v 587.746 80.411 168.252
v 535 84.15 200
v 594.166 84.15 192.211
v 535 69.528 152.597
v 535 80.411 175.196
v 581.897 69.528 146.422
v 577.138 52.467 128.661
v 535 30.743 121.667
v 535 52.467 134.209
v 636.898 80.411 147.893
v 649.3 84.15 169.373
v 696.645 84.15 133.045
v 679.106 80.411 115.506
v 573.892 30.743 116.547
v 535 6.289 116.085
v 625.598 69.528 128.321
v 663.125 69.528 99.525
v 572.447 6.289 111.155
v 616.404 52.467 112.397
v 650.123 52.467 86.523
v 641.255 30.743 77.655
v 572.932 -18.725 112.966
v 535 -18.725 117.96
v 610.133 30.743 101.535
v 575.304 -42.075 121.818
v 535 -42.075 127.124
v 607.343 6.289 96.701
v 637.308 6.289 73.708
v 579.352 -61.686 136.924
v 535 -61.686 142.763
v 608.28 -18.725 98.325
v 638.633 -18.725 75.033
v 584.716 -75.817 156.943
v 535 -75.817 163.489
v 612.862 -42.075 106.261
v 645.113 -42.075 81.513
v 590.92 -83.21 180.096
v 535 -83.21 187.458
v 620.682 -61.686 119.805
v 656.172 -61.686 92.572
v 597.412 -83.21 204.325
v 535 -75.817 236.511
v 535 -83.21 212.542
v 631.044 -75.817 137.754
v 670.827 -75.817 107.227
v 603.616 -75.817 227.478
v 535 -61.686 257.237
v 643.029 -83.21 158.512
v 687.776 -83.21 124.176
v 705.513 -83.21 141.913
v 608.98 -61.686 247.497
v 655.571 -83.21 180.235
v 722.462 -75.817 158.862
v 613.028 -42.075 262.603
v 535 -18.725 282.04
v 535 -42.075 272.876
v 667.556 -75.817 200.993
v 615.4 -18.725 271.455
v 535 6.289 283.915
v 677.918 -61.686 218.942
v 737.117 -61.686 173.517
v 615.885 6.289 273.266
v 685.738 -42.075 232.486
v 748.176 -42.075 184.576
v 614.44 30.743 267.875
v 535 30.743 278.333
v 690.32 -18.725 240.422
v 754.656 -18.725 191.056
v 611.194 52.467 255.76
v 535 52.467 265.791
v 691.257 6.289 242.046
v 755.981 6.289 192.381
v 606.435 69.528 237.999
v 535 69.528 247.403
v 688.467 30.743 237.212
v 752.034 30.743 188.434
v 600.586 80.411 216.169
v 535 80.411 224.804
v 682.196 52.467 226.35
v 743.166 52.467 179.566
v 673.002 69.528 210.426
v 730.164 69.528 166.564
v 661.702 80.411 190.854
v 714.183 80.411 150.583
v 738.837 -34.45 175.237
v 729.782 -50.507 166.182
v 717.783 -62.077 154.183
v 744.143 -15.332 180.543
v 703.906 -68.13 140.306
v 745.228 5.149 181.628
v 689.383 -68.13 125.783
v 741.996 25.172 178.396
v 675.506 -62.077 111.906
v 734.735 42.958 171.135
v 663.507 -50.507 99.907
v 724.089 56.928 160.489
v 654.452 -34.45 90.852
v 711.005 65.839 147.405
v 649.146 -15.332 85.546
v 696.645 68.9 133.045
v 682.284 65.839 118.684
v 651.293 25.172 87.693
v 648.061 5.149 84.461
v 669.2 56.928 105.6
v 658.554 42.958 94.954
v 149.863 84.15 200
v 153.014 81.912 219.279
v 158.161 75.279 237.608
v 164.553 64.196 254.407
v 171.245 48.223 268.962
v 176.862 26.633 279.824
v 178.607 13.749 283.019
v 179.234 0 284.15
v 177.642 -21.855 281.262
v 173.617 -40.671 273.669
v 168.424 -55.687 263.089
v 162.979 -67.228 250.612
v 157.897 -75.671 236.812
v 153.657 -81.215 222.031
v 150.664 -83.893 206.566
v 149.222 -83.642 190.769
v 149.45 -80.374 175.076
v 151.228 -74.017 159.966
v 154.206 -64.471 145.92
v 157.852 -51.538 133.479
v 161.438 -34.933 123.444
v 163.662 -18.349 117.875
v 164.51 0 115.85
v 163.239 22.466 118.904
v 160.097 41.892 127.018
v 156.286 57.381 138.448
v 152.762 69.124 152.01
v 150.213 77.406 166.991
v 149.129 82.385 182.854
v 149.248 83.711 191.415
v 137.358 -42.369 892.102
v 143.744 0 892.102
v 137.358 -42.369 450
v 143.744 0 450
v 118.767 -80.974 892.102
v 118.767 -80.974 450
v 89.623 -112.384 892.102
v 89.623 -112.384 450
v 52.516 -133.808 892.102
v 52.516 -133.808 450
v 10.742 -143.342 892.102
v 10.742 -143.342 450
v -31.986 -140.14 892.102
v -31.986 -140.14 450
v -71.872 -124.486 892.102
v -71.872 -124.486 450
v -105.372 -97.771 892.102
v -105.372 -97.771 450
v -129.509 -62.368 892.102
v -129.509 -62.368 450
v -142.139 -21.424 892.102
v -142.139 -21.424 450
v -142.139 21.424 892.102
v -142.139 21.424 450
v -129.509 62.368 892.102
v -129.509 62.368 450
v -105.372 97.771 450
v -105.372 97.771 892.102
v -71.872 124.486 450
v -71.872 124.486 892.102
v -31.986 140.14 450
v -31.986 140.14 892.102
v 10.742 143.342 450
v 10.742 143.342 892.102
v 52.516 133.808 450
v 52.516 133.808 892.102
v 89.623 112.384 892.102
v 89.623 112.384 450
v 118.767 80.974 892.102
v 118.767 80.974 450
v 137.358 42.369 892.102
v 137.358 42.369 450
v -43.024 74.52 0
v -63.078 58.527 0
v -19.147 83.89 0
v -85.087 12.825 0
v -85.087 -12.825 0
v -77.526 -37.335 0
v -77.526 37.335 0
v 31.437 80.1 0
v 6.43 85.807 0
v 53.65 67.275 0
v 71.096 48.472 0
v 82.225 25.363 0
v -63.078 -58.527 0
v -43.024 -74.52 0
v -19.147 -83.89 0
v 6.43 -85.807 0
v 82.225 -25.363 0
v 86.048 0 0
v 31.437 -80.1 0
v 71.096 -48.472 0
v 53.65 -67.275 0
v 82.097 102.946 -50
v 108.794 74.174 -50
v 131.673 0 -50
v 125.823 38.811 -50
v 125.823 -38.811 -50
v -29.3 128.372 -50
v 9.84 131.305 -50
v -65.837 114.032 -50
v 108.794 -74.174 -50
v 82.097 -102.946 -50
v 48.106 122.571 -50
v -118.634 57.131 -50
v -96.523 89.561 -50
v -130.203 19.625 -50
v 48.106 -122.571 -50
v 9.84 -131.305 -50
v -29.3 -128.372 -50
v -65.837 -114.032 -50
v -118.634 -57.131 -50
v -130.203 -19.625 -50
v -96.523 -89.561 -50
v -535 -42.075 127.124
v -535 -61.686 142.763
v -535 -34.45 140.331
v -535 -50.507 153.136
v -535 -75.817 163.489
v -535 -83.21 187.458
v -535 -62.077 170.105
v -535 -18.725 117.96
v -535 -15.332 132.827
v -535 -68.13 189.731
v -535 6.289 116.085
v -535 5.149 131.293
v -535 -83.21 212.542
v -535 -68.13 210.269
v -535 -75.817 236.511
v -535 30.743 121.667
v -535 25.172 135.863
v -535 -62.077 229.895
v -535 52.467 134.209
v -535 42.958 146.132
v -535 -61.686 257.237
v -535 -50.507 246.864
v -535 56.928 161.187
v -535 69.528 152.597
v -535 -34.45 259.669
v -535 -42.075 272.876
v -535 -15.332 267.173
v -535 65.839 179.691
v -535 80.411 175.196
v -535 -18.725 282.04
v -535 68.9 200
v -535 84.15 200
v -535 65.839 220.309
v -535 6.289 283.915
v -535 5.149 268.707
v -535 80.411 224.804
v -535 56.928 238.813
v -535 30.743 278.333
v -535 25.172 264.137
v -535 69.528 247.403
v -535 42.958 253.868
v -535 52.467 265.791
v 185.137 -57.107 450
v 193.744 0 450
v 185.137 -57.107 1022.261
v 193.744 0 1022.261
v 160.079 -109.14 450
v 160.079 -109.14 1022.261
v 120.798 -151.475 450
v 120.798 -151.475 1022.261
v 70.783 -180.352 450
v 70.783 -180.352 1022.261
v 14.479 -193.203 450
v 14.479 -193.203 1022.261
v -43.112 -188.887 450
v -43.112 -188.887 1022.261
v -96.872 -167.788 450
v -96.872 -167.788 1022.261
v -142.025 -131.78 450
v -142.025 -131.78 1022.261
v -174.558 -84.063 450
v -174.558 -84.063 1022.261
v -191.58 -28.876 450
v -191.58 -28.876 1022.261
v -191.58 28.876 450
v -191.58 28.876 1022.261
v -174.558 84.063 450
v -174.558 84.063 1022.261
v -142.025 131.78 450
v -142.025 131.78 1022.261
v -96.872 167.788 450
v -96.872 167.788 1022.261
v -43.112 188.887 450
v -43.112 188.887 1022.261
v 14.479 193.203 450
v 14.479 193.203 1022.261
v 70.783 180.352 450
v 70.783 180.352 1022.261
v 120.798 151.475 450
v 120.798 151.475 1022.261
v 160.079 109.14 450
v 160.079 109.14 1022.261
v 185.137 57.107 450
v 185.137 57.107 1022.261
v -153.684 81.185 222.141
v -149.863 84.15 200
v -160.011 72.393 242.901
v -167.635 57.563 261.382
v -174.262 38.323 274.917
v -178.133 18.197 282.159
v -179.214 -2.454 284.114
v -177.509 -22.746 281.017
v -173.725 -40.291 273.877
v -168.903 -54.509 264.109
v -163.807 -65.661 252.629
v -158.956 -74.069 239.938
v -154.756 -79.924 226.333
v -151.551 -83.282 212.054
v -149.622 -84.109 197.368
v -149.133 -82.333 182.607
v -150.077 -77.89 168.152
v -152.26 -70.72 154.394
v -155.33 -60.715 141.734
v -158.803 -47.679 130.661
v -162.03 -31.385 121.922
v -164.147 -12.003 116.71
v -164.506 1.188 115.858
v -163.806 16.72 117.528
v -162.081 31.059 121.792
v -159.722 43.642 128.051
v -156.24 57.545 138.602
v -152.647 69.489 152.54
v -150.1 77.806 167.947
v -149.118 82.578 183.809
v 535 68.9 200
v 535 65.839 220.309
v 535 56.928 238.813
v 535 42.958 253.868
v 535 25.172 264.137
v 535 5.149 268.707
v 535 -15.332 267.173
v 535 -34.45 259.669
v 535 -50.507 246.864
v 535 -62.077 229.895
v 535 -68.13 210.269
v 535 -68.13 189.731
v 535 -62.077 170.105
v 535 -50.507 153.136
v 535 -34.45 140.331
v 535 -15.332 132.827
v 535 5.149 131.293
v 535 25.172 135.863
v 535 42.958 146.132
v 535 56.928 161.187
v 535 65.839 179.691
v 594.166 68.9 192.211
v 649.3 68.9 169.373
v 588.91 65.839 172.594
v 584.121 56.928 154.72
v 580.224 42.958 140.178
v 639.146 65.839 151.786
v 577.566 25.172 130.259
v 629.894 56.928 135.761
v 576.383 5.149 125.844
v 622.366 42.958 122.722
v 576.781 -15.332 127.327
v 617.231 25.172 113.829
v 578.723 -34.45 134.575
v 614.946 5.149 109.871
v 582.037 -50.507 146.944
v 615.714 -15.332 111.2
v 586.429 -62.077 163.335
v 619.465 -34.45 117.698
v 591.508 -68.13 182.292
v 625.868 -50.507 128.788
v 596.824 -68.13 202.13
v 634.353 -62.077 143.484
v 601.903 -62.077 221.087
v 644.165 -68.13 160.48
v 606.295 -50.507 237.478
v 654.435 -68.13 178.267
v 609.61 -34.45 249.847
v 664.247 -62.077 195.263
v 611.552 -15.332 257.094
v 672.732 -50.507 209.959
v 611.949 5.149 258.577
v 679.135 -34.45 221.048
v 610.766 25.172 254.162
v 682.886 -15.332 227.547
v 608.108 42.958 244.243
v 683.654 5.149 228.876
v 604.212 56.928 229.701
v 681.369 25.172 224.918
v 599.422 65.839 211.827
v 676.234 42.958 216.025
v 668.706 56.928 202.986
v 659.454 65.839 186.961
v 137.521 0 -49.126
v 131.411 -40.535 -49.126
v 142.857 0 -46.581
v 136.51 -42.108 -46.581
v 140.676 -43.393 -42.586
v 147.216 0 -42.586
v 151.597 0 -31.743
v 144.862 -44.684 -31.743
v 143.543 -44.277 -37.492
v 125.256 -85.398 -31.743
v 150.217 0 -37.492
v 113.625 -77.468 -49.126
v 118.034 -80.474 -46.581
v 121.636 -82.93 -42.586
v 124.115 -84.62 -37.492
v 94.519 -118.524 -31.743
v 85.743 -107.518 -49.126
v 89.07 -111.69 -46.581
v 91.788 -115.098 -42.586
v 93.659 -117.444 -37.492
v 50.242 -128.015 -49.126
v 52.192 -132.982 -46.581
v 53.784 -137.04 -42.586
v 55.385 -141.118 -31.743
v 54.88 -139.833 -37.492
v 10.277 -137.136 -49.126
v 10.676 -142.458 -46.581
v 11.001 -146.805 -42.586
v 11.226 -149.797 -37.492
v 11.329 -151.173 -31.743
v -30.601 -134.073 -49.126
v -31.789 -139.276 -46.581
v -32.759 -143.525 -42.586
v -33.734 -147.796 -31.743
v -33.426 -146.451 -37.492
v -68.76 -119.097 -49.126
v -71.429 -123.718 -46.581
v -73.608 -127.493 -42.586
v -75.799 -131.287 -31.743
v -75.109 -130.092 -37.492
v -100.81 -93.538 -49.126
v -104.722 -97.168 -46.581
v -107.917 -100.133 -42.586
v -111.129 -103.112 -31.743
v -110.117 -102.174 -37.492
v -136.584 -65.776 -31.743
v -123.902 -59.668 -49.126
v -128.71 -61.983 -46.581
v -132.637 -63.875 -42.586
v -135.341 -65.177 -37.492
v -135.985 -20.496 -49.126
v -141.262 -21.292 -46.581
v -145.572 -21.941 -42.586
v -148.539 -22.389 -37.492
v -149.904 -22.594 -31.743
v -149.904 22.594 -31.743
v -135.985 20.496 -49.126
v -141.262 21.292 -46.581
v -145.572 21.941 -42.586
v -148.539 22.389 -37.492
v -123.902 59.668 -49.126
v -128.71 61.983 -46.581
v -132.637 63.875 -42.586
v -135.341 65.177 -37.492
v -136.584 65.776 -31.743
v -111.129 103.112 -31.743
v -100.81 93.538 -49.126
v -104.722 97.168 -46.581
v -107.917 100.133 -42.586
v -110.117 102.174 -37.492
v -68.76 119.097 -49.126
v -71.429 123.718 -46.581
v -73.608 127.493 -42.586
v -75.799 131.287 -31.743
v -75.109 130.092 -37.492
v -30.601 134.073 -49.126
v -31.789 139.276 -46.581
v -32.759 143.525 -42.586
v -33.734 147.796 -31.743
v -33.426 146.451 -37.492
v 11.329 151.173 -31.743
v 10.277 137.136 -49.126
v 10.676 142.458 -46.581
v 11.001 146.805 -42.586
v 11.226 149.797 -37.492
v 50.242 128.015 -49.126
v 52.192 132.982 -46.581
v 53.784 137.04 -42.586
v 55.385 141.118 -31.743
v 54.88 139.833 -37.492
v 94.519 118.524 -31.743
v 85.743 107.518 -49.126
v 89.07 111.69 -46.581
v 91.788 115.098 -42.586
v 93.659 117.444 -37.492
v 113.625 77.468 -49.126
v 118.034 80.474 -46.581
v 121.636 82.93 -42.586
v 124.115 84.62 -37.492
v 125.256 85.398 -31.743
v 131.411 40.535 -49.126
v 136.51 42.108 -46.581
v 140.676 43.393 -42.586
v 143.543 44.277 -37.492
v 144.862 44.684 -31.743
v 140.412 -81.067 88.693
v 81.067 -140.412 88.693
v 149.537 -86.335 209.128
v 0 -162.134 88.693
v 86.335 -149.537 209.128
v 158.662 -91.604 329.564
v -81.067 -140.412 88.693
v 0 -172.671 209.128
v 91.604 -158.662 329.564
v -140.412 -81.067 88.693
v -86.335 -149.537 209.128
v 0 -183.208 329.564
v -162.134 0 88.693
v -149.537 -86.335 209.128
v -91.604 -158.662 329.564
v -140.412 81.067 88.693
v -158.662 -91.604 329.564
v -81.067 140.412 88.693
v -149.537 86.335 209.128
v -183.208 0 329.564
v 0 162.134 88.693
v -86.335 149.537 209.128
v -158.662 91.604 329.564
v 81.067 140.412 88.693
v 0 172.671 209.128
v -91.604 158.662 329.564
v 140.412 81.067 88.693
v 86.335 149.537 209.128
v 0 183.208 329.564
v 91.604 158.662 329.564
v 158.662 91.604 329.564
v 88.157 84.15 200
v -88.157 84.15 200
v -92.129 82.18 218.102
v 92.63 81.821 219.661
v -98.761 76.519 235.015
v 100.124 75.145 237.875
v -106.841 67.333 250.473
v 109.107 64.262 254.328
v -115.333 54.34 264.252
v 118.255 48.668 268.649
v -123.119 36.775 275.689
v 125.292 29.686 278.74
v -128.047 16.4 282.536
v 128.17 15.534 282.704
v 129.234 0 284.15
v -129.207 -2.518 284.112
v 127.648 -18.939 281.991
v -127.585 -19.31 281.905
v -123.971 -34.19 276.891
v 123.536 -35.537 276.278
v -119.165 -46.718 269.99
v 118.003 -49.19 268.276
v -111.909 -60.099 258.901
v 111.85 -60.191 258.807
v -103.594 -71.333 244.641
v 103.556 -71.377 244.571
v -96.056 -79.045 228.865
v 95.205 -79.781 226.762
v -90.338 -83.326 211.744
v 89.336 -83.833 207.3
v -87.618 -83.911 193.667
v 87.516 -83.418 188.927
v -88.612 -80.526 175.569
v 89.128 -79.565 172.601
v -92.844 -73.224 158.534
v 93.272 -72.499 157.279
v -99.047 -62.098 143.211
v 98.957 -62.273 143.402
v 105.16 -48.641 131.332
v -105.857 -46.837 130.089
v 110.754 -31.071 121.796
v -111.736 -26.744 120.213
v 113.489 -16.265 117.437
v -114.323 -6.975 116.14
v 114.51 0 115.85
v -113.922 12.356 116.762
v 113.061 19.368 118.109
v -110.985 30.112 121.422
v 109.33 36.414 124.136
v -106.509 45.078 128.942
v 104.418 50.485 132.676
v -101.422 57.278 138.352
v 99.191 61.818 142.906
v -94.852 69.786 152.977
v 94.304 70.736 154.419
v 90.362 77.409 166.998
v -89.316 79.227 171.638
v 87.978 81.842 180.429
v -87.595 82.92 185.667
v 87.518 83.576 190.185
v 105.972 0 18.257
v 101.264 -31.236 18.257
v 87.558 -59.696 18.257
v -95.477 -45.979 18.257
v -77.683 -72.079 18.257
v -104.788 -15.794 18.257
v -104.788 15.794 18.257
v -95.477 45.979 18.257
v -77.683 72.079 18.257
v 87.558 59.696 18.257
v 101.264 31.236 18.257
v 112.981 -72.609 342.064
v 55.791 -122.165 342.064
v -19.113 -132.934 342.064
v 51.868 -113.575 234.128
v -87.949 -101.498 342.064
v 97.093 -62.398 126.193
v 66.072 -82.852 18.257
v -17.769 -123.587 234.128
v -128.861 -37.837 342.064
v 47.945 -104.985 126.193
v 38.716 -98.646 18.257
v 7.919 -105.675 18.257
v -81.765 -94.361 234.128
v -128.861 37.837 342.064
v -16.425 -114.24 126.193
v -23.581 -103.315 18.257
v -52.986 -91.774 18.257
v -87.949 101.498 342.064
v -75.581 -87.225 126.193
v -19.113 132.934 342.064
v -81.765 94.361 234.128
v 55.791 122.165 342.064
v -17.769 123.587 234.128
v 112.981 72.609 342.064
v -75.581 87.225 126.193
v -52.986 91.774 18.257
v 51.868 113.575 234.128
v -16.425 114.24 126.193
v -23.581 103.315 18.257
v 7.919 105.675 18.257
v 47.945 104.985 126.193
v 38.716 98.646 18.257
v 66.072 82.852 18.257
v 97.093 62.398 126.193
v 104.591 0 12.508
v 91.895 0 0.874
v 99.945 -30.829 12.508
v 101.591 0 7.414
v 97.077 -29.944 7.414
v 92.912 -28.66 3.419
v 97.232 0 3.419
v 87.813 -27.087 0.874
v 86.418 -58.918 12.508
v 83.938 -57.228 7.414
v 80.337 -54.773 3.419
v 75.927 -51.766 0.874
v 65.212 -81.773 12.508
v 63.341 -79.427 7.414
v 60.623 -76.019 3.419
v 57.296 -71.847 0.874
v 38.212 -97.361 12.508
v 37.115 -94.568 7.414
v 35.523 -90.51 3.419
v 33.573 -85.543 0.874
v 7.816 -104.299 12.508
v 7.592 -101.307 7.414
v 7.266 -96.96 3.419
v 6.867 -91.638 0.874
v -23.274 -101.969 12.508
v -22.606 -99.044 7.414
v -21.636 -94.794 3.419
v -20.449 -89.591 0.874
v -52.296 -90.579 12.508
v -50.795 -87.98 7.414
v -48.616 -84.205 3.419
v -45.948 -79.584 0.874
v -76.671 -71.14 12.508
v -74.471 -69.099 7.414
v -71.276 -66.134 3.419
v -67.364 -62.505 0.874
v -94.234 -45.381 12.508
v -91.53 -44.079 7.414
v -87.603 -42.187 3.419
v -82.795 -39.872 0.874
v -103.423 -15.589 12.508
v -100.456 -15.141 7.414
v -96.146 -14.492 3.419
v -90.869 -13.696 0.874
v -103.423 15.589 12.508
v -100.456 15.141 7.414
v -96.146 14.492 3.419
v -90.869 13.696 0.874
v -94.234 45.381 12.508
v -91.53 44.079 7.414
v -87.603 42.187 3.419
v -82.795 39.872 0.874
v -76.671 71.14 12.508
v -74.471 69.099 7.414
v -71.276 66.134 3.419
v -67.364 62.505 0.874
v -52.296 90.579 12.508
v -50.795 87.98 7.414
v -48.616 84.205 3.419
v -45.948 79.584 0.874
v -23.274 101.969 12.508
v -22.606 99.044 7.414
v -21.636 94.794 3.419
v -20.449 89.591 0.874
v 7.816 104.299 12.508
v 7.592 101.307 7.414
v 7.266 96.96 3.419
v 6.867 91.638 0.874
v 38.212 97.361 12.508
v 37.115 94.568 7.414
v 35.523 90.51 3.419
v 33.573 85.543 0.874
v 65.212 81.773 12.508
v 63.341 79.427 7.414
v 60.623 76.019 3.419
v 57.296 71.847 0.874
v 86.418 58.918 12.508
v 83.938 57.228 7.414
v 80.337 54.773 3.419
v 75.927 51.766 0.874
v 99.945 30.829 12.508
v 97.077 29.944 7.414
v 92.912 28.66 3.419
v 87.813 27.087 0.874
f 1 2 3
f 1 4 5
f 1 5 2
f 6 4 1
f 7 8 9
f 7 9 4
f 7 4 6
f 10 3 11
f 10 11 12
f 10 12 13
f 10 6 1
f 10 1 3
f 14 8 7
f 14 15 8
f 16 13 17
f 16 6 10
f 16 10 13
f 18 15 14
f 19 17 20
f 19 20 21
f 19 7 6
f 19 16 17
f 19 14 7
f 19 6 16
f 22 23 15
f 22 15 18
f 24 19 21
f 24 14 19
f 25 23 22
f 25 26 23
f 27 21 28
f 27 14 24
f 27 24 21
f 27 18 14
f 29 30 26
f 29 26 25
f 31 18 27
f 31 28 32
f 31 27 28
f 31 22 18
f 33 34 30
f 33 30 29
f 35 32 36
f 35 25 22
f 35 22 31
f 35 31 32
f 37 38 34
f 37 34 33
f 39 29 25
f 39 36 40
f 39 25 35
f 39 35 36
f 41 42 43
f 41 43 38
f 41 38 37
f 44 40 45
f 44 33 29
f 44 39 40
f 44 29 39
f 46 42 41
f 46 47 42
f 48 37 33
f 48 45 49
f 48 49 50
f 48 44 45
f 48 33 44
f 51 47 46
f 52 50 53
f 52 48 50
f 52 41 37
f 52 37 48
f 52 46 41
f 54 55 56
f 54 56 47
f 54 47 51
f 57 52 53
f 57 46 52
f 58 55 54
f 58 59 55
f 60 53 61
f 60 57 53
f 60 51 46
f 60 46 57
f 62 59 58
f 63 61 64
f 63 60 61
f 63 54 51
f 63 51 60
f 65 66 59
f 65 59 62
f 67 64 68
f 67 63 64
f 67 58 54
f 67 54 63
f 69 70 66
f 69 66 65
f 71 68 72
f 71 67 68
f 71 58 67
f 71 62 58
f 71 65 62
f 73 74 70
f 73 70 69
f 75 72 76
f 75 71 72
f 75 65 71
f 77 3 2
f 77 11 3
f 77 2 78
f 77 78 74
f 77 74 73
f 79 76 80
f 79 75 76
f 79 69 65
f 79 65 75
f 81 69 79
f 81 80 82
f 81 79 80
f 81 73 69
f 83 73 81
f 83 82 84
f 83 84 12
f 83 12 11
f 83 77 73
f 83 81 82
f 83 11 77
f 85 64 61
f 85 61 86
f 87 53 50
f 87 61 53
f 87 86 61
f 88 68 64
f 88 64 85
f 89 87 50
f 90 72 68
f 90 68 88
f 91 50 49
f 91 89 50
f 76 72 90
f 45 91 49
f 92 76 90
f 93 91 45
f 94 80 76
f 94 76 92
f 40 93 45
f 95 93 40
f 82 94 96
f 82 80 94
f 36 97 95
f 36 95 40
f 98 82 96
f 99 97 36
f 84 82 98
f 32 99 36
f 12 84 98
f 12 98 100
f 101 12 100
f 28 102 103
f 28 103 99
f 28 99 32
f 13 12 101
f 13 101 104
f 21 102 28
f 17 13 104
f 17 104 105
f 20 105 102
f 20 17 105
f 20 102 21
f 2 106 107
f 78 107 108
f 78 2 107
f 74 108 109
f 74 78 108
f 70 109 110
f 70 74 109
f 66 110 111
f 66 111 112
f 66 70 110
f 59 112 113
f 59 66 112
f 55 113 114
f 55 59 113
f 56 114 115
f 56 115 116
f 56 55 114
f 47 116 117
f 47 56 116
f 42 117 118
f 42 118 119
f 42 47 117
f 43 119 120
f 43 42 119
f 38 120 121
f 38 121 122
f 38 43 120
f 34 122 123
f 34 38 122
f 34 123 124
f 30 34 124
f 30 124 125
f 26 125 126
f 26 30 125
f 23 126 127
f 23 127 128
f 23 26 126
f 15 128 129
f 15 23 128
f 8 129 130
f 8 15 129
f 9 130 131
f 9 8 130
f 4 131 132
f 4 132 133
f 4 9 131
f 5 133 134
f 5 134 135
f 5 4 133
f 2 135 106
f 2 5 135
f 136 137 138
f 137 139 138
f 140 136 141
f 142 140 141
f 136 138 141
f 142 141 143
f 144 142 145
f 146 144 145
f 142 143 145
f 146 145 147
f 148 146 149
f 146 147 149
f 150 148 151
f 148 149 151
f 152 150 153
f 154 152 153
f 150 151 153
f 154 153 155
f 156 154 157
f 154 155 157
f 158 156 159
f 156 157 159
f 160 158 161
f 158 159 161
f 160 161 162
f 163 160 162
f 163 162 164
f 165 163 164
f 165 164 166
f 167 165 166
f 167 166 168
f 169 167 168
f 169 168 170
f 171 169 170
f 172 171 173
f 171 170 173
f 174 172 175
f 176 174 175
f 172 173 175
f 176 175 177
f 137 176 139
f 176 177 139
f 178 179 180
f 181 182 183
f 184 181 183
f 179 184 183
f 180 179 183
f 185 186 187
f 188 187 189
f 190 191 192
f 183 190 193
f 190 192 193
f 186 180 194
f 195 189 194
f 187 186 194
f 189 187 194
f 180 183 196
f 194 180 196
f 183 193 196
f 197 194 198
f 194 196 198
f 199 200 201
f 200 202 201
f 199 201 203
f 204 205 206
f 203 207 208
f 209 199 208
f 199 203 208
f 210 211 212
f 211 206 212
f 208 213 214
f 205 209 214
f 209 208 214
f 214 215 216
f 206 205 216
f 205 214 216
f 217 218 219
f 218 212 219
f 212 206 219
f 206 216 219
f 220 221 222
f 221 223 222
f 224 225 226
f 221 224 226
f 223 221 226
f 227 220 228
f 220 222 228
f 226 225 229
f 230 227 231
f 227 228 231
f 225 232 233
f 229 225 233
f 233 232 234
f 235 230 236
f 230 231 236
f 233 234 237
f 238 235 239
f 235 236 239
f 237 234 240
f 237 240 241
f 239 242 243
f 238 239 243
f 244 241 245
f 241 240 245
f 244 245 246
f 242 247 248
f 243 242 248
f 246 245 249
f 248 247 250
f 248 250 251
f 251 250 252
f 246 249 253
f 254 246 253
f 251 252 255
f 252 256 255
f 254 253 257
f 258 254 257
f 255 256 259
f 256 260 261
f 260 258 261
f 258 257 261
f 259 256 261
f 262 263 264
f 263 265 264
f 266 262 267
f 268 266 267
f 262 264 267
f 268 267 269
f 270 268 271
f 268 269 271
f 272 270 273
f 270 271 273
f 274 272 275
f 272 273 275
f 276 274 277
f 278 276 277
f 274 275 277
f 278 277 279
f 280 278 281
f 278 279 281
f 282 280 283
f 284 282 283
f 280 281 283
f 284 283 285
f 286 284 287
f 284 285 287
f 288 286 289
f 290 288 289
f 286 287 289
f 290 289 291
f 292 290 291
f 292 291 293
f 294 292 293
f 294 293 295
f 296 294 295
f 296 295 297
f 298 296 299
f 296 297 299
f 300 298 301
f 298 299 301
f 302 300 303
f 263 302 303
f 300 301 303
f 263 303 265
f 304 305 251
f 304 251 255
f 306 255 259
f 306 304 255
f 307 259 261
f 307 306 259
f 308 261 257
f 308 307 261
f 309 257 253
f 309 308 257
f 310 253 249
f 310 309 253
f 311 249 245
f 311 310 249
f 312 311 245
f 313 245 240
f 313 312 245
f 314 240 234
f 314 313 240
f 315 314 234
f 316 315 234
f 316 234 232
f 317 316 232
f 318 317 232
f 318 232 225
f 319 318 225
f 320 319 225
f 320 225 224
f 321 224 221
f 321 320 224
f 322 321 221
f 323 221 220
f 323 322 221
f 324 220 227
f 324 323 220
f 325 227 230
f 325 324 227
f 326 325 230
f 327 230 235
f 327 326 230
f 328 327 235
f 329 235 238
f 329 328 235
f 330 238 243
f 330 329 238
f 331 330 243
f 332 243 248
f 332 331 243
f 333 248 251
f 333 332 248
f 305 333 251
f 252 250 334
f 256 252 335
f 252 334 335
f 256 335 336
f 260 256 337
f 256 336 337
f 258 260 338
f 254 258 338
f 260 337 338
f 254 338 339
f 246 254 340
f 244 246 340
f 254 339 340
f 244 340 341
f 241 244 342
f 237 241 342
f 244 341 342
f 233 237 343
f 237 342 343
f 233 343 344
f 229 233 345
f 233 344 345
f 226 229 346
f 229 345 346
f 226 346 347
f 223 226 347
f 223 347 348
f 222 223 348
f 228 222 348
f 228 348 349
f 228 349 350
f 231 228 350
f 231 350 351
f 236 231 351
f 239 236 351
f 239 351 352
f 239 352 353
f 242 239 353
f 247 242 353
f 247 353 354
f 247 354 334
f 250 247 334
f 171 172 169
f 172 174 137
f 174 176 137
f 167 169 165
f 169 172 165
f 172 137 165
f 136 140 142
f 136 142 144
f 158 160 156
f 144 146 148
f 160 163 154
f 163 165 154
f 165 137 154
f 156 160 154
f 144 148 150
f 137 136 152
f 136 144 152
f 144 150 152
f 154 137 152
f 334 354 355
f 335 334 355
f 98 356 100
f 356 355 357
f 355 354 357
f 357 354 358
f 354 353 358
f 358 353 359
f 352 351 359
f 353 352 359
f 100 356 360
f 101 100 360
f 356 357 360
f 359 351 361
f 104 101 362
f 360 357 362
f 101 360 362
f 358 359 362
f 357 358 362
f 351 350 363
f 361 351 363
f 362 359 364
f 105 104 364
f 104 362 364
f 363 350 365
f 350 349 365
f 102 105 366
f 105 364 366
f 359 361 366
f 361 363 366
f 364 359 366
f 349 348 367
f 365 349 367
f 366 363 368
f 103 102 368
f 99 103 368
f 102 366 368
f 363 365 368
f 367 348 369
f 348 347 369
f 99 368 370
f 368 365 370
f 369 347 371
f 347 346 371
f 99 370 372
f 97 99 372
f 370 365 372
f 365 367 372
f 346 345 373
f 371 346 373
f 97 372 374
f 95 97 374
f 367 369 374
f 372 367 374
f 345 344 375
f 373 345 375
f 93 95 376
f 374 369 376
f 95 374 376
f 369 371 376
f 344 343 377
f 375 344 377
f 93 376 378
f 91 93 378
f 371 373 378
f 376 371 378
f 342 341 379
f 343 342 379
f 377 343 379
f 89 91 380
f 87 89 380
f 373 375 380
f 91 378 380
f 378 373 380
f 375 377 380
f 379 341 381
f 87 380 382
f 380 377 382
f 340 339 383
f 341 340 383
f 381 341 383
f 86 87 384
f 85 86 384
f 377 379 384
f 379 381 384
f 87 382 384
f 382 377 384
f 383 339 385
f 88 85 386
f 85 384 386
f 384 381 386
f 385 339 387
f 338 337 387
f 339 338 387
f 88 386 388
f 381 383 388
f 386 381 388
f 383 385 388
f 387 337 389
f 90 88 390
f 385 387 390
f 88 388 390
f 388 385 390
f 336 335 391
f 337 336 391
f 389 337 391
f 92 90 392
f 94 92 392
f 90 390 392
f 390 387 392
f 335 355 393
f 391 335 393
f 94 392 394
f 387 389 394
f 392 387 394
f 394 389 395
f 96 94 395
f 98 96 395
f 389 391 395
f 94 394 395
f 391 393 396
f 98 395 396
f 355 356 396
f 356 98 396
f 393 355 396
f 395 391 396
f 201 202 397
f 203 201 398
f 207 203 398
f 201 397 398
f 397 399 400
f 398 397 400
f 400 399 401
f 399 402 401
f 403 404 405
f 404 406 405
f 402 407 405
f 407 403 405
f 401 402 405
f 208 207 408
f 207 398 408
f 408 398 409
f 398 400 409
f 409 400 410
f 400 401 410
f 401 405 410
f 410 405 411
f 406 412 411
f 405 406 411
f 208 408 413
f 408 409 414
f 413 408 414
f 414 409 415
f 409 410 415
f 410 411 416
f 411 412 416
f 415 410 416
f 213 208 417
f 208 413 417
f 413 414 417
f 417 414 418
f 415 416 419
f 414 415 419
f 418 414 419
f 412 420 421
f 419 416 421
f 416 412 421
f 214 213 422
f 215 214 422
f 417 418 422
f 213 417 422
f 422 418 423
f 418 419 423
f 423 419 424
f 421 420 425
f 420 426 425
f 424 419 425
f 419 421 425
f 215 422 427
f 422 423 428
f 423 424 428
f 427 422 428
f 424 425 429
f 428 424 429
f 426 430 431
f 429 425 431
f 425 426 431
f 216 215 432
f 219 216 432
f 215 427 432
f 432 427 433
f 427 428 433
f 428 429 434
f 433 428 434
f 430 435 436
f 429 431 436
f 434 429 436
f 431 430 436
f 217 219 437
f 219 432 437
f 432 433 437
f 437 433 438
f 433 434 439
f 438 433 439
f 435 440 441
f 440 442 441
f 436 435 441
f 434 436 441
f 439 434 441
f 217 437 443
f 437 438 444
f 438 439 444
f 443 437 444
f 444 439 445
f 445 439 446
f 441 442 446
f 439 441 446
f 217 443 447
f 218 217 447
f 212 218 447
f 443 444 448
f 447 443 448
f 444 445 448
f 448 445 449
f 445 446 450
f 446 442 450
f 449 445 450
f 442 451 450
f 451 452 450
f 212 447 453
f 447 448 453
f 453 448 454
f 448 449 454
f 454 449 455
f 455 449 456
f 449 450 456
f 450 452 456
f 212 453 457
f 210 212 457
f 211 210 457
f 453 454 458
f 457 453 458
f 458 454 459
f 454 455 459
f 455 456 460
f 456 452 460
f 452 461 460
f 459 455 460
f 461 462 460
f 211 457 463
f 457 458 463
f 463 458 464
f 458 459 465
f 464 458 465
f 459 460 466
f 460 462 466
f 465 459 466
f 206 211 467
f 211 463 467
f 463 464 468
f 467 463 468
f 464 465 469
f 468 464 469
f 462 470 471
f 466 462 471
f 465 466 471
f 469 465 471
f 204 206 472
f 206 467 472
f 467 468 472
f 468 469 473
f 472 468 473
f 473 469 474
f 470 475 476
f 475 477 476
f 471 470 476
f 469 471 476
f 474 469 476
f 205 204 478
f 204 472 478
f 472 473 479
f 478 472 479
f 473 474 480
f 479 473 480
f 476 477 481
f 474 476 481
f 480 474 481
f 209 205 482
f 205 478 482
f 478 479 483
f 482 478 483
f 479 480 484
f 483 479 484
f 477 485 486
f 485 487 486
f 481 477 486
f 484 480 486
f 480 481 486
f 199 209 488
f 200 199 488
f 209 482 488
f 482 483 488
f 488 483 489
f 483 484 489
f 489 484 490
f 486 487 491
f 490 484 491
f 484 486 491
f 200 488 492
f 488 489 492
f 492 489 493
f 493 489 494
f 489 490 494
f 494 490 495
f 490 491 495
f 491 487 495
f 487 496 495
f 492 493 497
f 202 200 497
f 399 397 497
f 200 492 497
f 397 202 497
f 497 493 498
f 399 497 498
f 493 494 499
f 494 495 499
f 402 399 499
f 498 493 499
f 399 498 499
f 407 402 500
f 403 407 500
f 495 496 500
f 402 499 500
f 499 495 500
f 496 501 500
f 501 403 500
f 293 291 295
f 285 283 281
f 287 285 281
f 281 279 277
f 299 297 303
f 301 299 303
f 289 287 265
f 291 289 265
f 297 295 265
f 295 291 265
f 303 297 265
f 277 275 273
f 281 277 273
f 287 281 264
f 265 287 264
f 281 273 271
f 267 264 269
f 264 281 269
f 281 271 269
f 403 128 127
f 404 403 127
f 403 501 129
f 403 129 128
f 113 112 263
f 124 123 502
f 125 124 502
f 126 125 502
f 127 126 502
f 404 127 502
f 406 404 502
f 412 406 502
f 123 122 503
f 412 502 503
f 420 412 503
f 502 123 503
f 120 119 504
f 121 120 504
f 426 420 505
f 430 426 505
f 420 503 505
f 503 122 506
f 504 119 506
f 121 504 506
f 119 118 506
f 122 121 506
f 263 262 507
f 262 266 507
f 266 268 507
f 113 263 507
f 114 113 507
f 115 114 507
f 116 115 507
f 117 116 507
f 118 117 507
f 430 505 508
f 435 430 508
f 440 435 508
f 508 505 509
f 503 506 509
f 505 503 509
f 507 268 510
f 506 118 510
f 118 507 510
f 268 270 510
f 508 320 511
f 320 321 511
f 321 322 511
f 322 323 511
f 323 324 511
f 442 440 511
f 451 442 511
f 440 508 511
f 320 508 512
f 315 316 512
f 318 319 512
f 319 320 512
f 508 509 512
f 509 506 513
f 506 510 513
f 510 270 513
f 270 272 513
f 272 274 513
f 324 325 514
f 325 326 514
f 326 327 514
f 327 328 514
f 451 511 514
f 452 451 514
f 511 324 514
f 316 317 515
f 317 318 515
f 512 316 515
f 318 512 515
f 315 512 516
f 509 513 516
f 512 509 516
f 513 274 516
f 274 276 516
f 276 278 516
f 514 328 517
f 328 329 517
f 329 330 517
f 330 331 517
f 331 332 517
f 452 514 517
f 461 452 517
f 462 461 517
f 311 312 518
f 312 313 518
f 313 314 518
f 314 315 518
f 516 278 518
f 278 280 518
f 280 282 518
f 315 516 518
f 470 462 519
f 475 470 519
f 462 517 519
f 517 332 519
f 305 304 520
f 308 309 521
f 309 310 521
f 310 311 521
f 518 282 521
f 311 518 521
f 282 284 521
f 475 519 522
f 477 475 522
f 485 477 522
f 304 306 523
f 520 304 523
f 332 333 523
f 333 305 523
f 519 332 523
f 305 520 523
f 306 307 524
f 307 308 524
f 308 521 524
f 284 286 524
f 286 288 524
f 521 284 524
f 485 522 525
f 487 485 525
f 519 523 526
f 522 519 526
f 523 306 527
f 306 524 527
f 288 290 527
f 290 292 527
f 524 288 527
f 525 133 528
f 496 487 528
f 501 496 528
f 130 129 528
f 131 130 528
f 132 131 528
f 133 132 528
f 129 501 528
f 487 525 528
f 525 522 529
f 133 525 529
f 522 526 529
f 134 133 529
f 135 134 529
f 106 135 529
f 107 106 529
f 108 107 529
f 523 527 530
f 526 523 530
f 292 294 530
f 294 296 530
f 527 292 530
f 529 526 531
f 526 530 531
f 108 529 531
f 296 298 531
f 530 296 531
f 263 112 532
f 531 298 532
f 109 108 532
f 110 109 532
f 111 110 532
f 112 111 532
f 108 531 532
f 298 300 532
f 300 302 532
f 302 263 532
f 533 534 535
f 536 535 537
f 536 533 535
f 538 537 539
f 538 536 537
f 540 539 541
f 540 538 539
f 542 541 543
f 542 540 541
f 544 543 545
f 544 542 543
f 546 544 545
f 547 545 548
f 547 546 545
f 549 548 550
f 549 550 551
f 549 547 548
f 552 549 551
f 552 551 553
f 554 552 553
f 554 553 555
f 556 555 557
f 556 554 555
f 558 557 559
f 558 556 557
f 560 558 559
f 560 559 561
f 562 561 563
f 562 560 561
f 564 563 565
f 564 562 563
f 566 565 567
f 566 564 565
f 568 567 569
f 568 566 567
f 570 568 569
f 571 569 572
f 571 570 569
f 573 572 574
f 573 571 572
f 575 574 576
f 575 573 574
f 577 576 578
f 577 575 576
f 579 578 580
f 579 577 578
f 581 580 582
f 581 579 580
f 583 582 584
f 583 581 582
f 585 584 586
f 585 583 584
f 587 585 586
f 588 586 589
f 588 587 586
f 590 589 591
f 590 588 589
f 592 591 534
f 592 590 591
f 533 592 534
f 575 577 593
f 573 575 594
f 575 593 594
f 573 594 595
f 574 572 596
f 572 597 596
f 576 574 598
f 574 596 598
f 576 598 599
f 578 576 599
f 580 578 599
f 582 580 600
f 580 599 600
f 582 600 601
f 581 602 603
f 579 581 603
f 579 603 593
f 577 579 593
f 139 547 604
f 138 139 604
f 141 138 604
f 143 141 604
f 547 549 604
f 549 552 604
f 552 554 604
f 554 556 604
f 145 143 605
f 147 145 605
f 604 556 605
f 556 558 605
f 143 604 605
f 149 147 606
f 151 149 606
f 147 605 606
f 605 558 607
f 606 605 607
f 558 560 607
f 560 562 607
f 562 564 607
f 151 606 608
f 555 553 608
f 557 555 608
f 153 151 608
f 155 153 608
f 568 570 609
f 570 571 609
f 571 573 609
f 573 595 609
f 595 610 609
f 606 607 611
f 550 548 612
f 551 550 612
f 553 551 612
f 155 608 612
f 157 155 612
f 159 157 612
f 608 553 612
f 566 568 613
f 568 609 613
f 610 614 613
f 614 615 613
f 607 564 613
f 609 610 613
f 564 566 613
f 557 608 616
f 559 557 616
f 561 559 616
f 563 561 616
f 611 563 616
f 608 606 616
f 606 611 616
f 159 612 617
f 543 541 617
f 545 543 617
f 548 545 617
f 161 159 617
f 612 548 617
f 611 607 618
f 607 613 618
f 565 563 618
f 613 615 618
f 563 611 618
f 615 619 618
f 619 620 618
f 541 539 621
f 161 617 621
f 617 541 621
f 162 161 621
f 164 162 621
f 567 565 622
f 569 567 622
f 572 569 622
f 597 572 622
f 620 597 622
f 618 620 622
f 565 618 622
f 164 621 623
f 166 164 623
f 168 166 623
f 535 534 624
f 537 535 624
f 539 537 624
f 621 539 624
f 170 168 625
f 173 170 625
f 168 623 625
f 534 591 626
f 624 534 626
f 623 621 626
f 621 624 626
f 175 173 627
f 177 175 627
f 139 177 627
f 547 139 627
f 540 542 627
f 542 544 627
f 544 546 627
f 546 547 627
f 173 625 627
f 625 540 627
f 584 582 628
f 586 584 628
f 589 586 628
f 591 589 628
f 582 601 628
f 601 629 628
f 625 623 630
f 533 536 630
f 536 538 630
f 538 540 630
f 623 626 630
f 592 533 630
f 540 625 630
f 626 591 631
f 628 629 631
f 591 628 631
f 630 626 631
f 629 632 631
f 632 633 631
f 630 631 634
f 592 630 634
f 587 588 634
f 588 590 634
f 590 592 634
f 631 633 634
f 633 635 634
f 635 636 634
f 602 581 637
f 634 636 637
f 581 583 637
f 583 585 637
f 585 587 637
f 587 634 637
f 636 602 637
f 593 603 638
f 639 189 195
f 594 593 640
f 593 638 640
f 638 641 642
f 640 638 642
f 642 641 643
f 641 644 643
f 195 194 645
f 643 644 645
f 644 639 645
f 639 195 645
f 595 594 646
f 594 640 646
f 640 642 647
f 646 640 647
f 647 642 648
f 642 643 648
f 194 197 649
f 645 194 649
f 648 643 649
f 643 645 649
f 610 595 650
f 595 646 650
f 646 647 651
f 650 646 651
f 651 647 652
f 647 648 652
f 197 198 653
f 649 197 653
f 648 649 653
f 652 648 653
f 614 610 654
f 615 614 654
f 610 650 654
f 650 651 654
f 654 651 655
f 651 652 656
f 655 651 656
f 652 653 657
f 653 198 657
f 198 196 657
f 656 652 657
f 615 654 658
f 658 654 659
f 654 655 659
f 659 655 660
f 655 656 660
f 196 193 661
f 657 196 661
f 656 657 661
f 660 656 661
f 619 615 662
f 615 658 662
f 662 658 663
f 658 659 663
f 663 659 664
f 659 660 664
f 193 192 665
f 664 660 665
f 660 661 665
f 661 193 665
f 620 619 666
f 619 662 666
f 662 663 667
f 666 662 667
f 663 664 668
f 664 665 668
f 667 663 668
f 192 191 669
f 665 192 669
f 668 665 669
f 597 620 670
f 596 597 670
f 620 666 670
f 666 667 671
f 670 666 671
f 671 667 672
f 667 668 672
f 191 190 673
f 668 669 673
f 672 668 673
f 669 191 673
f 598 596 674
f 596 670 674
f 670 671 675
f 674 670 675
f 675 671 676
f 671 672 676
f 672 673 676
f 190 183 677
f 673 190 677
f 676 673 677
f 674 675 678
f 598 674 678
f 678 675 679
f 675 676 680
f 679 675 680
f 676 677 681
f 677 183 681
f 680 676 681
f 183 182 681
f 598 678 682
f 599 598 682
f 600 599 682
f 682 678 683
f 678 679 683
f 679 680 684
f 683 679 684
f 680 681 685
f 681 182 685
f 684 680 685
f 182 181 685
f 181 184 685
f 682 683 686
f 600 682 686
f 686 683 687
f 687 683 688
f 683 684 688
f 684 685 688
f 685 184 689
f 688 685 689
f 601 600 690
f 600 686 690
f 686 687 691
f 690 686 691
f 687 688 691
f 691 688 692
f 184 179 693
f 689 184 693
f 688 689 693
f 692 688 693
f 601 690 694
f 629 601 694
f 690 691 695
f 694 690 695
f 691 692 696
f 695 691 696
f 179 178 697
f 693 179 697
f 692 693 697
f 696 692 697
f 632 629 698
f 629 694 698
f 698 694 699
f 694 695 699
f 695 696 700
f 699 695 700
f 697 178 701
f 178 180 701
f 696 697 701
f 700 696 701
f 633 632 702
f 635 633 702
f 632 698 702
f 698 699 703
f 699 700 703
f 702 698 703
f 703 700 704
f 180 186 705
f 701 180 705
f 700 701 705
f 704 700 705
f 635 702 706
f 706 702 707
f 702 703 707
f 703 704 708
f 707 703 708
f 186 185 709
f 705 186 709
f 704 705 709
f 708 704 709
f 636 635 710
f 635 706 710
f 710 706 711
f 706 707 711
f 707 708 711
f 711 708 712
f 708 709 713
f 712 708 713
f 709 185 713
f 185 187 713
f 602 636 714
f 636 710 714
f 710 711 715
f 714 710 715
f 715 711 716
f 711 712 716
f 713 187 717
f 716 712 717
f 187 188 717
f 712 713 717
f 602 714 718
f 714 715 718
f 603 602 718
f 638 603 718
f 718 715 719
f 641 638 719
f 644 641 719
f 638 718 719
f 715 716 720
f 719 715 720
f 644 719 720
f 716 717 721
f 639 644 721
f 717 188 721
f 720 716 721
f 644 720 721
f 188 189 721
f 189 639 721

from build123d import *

# Parameters (mm, degrees)
F2_R         = 84.15
F3_DEPTH     = 535
F5_D         = 137.8
F3_FACE1_R   = 84.15
F3_FACE1_R_2 = 68.9


with BuildPart() as f1:
    # F0 (on Front) → F1 (revolve)
    with BuildSketch(Plane.XZ):
        with BuildLine():
            Line((86.0478096959, 0), (0, 0))
            Line((0, 0), (0, -50))
            Line((0, -50), (131.6733765197, -50))
            ThreePointArc((131.6733765197, -50), (145.185180672, -44.7455467362), (151.5972704815, -31.743114855))
            Line((151.5972704815, -31.743114855), (193.744331763, 450))
            Line((193.744331763, 450), (193.744331763, 1022.2607851028))
            Line((193.744331763, 1022.2607851028), (0, 1022.2607851028))
            Line((0, 1022.2607851028), (0, 892.1018242836))
            Line((0, 892.1018242836), (143.744331763, 892.1018242836))
            Line((143.744331763, 892.1018242836), (143.744331763, 450))
            Line((143.744331763, 450), (105.9717036578, 18.256885145))
            ThreePointArc((105.9717036578, 18.256885145), (99.5596138483, 5.2544532638), (86.0478096959, 0))
        make_face()
    revolve(axis=Axis((0, 0, -25), (0, 0, -1)))

    # F2 (on Right) → F3 (join, symmetric)
    with BuildSketch(Plane.YZ):
        with Locations((0, 200)):
            Circle(F2_R)
    extrude(amount=F3_DEPTH, both=True)

    # F5 (through all)
    with Locations(Plane(origin=(-535, 0, 0), x_dir=(0, -1, 0), z_dir=(-1, 0, 0))):
        with Locations((0, 200)):
            Hole(F5_D / 2)

    # F8: sweep along a path in F7
    with BuildLine(Plane(origin=(0, 0, 0), x_dir=(-1, 0, 0), z_dir=(0, 1, 0))) as f8_path:
        ThreePointArc((-535, 200), (-622.4814326387, 182.5988611321), (-696.6446101792, 133.0446101792))
    # F3_face1 (on face) → F8 (sweep)
    with BuildSketch(Plane(origin=(535, 0, 200), x_dir=(0, 1, 0), z_dir=(1, 0, 0))):
        Circle(F3_FACE1_R)
        Circle(F3_FACE1_R_2, mode=Mode.SUBTRACT)
    sweep(path=f8_path.line)


solid = f1.part
